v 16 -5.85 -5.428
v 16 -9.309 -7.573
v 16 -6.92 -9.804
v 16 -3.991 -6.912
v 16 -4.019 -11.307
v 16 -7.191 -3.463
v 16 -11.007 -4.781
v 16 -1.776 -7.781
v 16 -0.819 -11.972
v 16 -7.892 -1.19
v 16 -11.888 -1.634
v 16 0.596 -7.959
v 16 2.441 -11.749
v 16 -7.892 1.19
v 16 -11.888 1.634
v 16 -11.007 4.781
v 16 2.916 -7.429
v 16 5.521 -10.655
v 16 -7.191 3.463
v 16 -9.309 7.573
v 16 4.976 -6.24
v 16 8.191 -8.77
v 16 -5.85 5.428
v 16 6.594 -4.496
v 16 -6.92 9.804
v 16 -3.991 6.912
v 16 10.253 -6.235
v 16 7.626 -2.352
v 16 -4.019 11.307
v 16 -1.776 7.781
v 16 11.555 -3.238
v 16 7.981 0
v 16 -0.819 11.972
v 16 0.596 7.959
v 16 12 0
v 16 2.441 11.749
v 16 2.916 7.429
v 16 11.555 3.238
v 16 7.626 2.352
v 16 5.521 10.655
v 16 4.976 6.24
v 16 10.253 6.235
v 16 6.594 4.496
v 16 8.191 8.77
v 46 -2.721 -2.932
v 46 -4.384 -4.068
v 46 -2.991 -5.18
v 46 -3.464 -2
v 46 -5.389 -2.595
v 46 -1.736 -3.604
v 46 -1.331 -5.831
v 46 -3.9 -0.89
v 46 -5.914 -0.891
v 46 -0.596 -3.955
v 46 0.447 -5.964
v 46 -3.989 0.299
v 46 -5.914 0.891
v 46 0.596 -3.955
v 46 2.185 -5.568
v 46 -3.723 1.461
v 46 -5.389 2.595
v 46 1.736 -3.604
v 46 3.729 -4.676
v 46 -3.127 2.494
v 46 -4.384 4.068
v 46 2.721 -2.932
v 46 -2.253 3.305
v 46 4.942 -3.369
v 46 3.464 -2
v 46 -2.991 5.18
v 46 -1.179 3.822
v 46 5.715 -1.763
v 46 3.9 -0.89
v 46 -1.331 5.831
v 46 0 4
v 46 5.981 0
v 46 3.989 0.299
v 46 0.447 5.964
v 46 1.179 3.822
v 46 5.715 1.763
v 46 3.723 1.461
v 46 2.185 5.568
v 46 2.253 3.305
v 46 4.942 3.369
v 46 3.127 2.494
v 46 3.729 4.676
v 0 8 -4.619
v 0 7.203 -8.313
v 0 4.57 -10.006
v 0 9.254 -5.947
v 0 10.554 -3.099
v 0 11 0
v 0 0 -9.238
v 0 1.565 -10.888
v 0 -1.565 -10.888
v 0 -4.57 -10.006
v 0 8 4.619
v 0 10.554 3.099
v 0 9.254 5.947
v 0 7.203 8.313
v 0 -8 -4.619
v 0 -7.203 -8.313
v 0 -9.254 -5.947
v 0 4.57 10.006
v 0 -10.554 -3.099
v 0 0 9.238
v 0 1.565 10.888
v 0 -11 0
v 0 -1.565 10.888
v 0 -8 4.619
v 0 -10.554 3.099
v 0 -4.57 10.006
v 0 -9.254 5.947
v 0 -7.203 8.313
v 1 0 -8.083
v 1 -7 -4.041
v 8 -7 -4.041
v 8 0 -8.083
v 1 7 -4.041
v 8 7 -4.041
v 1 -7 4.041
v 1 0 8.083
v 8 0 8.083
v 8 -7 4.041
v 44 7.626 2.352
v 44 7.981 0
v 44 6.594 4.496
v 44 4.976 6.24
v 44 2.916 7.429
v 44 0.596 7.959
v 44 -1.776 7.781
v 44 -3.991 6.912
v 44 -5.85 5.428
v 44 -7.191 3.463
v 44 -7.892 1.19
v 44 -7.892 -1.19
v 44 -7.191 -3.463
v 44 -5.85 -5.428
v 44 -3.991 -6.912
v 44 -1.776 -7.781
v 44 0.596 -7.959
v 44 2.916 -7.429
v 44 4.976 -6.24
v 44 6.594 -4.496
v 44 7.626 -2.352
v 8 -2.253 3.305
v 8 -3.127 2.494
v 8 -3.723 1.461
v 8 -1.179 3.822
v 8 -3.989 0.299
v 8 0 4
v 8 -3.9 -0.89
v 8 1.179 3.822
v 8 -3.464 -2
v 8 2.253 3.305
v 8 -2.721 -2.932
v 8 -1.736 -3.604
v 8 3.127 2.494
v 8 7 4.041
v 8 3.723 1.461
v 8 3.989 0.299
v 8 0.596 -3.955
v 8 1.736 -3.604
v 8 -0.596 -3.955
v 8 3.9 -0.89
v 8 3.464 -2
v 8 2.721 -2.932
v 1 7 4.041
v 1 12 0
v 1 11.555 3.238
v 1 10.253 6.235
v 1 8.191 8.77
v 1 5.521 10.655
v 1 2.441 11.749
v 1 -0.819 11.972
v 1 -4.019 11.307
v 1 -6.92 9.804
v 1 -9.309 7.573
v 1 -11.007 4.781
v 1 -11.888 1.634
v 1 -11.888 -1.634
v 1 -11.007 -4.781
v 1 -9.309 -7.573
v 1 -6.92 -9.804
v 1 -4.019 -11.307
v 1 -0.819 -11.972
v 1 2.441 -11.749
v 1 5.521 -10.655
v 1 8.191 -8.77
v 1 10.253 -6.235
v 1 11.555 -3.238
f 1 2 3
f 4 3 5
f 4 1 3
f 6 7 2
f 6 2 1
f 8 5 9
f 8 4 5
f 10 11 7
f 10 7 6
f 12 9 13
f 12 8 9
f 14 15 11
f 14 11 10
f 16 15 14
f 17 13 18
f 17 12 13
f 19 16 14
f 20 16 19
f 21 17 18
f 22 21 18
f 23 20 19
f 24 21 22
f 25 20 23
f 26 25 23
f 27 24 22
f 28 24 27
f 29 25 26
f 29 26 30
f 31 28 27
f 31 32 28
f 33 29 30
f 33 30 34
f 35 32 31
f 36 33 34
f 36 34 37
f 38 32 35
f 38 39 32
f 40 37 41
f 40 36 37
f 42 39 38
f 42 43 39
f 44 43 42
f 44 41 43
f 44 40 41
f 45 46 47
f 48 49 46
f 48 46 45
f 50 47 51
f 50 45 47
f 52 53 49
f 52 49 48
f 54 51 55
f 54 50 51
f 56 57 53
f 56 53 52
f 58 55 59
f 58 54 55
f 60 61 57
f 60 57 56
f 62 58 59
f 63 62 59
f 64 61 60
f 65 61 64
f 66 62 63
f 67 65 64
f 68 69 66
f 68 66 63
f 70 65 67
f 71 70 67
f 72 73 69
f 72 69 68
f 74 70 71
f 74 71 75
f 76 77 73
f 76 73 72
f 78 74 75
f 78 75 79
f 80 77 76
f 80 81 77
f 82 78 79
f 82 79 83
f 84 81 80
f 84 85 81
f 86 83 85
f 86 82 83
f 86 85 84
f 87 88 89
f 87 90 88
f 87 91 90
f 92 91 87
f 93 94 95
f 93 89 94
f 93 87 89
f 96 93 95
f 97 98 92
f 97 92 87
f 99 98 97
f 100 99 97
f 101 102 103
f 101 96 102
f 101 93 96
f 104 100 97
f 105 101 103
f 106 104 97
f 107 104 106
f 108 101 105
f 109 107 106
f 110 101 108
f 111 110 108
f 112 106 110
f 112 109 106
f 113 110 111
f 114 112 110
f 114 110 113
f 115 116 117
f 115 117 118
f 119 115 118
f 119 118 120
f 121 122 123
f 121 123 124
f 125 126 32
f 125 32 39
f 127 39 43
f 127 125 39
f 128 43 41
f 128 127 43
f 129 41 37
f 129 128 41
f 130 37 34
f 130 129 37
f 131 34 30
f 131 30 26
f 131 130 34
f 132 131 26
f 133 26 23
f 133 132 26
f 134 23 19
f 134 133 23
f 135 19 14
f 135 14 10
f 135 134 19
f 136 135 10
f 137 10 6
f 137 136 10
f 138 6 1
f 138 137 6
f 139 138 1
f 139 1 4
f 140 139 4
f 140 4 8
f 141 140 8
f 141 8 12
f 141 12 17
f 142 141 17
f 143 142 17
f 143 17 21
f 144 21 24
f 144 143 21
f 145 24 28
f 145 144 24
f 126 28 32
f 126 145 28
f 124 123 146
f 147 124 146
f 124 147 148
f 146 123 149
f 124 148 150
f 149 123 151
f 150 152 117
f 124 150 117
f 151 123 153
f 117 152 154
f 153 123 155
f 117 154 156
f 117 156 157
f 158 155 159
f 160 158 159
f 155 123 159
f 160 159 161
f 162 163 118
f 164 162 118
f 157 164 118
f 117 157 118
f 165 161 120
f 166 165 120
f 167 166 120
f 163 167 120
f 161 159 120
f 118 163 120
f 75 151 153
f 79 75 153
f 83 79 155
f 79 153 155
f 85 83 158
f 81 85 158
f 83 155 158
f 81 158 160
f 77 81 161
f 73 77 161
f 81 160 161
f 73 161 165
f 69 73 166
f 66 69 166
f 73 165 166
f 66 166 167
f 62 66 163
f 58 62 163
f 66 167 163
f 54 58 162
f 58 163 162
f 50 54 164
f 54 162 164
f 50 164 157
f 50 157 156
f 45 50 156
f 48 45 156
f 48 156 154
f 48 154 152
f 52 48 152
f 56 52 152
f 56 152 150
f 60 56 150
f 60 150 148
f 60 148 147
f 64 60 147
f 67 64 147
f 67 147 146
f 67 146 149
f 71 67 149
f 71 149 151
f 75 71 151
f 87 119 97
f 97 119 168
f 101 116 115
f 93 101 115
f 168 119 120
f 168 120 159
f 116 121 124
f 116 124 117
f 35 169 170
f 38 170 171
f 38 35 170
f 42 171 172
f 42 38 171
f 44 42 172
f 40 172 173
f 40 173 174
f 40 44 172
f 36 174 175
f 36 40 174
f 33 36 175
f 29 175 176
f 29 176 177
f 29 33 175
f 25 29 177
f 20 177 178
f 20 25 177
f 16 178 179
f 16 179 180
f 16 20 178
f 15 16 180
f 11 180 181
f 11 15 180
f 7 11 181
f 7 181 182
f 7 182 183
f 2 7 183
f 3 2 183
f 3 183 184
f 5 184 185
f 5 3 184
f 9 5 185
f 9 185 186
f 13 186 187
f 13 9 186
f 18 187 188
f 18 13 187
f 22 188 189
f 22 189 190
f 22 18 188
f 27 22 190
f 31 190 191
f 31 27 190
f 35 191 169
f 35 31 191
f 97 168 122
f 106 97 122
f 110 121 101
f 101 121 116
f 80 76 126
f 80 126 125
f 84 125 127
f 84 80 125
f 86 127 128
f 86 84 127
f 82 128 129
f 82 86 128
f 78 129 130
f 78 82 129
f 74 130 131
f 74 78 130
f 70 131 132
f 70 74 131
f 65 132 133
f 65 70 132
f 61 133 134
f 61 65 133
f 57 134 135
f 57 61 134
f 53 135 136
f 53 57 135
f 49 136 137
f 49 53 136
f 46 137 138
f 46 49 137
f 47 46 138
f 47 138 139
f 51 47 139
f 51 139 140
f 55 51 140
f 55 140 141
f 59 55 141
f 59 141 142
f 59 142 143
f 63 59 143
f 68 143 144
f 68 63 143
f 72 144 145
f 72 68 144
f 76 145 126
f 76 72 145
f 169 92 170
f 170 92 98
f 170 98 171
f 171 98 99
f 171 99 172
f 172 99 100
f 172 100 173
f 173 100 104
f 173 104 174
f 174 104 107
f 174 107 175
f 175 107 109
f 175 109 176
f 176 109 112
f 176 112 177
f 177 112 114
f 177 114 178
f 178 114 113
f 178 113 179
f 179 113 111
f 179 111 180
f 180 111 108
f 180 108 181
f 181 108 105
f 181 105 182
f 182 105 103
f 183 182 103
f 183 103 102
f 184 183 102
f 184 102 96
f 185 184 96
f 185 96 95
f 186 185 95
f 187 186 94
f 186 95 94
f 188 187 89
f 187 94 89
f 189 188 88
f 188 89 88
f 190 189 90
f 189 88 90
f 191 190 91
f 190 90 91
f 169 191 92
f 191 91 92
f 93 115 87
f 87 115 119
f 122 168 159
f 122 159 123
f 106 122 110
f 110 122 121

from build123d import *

# Parameters (mm, degrees)
CHAMFER1_SIZE      = 2
CHAMFER2_SIZE      = 1
CUT_EXTRUDE1_DEPTH = 8
CHAMFER3_SIZE      = 1
SKETCH4_R          = 4
CUT_EXTRUDE2_DEPTH = 39


with BuildPart() as part:
    # Sketch1 → Revolve1 (revolve)
    with BuildSketch(Plane.XY):
        Polygon((0, 0), (0, 12), (16, 12), (16, 7.981), (46, 7.981), (46, 0), align=None)
    revolve(axis=Axis((-88.705490849, 0, 0), (1, 0, 0)))

    # Chamfer1
    chamfer1_edges = [part.edges().sort_by_distance(p)[0] for p in [
        (46, -7.981, 0),
    ]]
    chamfer(chamfer1_edges, length=CHAMFER1_SIZE)

    # Chamfer2
    chamfer2_edges = [part.edges().sort_by_distance(p)[0] for p in [
        (0, -12, 0),
    ]]
    chamfer(chamfer2_edges, length=CHAMFER2_SIZE)

    # Sketch3 → Cut-Extrude1 (cut)
    with BuildSketch(Plane(origin=(0, 0, 0), x_dir=(0, 0, -1), z_dir=(1, 0, 0))):
        Polygon((-8.082903769, 0), (-4.041451884, -7), (4.041451884, -7), (8.082903769, 0), (4.041451884, 7), (-4.041451884, 7), align=None)
    extrude(amount=CUT_EXTRUDE1_DEPTH, mode=Mode.SUBTRACT)

    # Chamfer3
    chamfer3_edges = [part.edges().sort_by_distance(p)[0] for p in [
        (0, 3.5, 6.062177826),
        (0, -3.5, 6.062177826),
        (0, -7, 0),
        (0, -3.5, -6.062177826),
        (0, 3.5, -6.062177826),
        (0, 7, 0),
    ]]
    chamfer(chamfer3_edges, length=CHAMFER3_SIZE)

    # Sketch4 → Cut-Extrude2 (cut, through all)
    with BuildSketch(Plane.ZY.offset(-8)):
        Circle(SKETCH4_R)
    extrude(amount=-CUT_EXTRUDE2_DEPTH, mode=Mode.SUBTRACT)


solid = part.part
